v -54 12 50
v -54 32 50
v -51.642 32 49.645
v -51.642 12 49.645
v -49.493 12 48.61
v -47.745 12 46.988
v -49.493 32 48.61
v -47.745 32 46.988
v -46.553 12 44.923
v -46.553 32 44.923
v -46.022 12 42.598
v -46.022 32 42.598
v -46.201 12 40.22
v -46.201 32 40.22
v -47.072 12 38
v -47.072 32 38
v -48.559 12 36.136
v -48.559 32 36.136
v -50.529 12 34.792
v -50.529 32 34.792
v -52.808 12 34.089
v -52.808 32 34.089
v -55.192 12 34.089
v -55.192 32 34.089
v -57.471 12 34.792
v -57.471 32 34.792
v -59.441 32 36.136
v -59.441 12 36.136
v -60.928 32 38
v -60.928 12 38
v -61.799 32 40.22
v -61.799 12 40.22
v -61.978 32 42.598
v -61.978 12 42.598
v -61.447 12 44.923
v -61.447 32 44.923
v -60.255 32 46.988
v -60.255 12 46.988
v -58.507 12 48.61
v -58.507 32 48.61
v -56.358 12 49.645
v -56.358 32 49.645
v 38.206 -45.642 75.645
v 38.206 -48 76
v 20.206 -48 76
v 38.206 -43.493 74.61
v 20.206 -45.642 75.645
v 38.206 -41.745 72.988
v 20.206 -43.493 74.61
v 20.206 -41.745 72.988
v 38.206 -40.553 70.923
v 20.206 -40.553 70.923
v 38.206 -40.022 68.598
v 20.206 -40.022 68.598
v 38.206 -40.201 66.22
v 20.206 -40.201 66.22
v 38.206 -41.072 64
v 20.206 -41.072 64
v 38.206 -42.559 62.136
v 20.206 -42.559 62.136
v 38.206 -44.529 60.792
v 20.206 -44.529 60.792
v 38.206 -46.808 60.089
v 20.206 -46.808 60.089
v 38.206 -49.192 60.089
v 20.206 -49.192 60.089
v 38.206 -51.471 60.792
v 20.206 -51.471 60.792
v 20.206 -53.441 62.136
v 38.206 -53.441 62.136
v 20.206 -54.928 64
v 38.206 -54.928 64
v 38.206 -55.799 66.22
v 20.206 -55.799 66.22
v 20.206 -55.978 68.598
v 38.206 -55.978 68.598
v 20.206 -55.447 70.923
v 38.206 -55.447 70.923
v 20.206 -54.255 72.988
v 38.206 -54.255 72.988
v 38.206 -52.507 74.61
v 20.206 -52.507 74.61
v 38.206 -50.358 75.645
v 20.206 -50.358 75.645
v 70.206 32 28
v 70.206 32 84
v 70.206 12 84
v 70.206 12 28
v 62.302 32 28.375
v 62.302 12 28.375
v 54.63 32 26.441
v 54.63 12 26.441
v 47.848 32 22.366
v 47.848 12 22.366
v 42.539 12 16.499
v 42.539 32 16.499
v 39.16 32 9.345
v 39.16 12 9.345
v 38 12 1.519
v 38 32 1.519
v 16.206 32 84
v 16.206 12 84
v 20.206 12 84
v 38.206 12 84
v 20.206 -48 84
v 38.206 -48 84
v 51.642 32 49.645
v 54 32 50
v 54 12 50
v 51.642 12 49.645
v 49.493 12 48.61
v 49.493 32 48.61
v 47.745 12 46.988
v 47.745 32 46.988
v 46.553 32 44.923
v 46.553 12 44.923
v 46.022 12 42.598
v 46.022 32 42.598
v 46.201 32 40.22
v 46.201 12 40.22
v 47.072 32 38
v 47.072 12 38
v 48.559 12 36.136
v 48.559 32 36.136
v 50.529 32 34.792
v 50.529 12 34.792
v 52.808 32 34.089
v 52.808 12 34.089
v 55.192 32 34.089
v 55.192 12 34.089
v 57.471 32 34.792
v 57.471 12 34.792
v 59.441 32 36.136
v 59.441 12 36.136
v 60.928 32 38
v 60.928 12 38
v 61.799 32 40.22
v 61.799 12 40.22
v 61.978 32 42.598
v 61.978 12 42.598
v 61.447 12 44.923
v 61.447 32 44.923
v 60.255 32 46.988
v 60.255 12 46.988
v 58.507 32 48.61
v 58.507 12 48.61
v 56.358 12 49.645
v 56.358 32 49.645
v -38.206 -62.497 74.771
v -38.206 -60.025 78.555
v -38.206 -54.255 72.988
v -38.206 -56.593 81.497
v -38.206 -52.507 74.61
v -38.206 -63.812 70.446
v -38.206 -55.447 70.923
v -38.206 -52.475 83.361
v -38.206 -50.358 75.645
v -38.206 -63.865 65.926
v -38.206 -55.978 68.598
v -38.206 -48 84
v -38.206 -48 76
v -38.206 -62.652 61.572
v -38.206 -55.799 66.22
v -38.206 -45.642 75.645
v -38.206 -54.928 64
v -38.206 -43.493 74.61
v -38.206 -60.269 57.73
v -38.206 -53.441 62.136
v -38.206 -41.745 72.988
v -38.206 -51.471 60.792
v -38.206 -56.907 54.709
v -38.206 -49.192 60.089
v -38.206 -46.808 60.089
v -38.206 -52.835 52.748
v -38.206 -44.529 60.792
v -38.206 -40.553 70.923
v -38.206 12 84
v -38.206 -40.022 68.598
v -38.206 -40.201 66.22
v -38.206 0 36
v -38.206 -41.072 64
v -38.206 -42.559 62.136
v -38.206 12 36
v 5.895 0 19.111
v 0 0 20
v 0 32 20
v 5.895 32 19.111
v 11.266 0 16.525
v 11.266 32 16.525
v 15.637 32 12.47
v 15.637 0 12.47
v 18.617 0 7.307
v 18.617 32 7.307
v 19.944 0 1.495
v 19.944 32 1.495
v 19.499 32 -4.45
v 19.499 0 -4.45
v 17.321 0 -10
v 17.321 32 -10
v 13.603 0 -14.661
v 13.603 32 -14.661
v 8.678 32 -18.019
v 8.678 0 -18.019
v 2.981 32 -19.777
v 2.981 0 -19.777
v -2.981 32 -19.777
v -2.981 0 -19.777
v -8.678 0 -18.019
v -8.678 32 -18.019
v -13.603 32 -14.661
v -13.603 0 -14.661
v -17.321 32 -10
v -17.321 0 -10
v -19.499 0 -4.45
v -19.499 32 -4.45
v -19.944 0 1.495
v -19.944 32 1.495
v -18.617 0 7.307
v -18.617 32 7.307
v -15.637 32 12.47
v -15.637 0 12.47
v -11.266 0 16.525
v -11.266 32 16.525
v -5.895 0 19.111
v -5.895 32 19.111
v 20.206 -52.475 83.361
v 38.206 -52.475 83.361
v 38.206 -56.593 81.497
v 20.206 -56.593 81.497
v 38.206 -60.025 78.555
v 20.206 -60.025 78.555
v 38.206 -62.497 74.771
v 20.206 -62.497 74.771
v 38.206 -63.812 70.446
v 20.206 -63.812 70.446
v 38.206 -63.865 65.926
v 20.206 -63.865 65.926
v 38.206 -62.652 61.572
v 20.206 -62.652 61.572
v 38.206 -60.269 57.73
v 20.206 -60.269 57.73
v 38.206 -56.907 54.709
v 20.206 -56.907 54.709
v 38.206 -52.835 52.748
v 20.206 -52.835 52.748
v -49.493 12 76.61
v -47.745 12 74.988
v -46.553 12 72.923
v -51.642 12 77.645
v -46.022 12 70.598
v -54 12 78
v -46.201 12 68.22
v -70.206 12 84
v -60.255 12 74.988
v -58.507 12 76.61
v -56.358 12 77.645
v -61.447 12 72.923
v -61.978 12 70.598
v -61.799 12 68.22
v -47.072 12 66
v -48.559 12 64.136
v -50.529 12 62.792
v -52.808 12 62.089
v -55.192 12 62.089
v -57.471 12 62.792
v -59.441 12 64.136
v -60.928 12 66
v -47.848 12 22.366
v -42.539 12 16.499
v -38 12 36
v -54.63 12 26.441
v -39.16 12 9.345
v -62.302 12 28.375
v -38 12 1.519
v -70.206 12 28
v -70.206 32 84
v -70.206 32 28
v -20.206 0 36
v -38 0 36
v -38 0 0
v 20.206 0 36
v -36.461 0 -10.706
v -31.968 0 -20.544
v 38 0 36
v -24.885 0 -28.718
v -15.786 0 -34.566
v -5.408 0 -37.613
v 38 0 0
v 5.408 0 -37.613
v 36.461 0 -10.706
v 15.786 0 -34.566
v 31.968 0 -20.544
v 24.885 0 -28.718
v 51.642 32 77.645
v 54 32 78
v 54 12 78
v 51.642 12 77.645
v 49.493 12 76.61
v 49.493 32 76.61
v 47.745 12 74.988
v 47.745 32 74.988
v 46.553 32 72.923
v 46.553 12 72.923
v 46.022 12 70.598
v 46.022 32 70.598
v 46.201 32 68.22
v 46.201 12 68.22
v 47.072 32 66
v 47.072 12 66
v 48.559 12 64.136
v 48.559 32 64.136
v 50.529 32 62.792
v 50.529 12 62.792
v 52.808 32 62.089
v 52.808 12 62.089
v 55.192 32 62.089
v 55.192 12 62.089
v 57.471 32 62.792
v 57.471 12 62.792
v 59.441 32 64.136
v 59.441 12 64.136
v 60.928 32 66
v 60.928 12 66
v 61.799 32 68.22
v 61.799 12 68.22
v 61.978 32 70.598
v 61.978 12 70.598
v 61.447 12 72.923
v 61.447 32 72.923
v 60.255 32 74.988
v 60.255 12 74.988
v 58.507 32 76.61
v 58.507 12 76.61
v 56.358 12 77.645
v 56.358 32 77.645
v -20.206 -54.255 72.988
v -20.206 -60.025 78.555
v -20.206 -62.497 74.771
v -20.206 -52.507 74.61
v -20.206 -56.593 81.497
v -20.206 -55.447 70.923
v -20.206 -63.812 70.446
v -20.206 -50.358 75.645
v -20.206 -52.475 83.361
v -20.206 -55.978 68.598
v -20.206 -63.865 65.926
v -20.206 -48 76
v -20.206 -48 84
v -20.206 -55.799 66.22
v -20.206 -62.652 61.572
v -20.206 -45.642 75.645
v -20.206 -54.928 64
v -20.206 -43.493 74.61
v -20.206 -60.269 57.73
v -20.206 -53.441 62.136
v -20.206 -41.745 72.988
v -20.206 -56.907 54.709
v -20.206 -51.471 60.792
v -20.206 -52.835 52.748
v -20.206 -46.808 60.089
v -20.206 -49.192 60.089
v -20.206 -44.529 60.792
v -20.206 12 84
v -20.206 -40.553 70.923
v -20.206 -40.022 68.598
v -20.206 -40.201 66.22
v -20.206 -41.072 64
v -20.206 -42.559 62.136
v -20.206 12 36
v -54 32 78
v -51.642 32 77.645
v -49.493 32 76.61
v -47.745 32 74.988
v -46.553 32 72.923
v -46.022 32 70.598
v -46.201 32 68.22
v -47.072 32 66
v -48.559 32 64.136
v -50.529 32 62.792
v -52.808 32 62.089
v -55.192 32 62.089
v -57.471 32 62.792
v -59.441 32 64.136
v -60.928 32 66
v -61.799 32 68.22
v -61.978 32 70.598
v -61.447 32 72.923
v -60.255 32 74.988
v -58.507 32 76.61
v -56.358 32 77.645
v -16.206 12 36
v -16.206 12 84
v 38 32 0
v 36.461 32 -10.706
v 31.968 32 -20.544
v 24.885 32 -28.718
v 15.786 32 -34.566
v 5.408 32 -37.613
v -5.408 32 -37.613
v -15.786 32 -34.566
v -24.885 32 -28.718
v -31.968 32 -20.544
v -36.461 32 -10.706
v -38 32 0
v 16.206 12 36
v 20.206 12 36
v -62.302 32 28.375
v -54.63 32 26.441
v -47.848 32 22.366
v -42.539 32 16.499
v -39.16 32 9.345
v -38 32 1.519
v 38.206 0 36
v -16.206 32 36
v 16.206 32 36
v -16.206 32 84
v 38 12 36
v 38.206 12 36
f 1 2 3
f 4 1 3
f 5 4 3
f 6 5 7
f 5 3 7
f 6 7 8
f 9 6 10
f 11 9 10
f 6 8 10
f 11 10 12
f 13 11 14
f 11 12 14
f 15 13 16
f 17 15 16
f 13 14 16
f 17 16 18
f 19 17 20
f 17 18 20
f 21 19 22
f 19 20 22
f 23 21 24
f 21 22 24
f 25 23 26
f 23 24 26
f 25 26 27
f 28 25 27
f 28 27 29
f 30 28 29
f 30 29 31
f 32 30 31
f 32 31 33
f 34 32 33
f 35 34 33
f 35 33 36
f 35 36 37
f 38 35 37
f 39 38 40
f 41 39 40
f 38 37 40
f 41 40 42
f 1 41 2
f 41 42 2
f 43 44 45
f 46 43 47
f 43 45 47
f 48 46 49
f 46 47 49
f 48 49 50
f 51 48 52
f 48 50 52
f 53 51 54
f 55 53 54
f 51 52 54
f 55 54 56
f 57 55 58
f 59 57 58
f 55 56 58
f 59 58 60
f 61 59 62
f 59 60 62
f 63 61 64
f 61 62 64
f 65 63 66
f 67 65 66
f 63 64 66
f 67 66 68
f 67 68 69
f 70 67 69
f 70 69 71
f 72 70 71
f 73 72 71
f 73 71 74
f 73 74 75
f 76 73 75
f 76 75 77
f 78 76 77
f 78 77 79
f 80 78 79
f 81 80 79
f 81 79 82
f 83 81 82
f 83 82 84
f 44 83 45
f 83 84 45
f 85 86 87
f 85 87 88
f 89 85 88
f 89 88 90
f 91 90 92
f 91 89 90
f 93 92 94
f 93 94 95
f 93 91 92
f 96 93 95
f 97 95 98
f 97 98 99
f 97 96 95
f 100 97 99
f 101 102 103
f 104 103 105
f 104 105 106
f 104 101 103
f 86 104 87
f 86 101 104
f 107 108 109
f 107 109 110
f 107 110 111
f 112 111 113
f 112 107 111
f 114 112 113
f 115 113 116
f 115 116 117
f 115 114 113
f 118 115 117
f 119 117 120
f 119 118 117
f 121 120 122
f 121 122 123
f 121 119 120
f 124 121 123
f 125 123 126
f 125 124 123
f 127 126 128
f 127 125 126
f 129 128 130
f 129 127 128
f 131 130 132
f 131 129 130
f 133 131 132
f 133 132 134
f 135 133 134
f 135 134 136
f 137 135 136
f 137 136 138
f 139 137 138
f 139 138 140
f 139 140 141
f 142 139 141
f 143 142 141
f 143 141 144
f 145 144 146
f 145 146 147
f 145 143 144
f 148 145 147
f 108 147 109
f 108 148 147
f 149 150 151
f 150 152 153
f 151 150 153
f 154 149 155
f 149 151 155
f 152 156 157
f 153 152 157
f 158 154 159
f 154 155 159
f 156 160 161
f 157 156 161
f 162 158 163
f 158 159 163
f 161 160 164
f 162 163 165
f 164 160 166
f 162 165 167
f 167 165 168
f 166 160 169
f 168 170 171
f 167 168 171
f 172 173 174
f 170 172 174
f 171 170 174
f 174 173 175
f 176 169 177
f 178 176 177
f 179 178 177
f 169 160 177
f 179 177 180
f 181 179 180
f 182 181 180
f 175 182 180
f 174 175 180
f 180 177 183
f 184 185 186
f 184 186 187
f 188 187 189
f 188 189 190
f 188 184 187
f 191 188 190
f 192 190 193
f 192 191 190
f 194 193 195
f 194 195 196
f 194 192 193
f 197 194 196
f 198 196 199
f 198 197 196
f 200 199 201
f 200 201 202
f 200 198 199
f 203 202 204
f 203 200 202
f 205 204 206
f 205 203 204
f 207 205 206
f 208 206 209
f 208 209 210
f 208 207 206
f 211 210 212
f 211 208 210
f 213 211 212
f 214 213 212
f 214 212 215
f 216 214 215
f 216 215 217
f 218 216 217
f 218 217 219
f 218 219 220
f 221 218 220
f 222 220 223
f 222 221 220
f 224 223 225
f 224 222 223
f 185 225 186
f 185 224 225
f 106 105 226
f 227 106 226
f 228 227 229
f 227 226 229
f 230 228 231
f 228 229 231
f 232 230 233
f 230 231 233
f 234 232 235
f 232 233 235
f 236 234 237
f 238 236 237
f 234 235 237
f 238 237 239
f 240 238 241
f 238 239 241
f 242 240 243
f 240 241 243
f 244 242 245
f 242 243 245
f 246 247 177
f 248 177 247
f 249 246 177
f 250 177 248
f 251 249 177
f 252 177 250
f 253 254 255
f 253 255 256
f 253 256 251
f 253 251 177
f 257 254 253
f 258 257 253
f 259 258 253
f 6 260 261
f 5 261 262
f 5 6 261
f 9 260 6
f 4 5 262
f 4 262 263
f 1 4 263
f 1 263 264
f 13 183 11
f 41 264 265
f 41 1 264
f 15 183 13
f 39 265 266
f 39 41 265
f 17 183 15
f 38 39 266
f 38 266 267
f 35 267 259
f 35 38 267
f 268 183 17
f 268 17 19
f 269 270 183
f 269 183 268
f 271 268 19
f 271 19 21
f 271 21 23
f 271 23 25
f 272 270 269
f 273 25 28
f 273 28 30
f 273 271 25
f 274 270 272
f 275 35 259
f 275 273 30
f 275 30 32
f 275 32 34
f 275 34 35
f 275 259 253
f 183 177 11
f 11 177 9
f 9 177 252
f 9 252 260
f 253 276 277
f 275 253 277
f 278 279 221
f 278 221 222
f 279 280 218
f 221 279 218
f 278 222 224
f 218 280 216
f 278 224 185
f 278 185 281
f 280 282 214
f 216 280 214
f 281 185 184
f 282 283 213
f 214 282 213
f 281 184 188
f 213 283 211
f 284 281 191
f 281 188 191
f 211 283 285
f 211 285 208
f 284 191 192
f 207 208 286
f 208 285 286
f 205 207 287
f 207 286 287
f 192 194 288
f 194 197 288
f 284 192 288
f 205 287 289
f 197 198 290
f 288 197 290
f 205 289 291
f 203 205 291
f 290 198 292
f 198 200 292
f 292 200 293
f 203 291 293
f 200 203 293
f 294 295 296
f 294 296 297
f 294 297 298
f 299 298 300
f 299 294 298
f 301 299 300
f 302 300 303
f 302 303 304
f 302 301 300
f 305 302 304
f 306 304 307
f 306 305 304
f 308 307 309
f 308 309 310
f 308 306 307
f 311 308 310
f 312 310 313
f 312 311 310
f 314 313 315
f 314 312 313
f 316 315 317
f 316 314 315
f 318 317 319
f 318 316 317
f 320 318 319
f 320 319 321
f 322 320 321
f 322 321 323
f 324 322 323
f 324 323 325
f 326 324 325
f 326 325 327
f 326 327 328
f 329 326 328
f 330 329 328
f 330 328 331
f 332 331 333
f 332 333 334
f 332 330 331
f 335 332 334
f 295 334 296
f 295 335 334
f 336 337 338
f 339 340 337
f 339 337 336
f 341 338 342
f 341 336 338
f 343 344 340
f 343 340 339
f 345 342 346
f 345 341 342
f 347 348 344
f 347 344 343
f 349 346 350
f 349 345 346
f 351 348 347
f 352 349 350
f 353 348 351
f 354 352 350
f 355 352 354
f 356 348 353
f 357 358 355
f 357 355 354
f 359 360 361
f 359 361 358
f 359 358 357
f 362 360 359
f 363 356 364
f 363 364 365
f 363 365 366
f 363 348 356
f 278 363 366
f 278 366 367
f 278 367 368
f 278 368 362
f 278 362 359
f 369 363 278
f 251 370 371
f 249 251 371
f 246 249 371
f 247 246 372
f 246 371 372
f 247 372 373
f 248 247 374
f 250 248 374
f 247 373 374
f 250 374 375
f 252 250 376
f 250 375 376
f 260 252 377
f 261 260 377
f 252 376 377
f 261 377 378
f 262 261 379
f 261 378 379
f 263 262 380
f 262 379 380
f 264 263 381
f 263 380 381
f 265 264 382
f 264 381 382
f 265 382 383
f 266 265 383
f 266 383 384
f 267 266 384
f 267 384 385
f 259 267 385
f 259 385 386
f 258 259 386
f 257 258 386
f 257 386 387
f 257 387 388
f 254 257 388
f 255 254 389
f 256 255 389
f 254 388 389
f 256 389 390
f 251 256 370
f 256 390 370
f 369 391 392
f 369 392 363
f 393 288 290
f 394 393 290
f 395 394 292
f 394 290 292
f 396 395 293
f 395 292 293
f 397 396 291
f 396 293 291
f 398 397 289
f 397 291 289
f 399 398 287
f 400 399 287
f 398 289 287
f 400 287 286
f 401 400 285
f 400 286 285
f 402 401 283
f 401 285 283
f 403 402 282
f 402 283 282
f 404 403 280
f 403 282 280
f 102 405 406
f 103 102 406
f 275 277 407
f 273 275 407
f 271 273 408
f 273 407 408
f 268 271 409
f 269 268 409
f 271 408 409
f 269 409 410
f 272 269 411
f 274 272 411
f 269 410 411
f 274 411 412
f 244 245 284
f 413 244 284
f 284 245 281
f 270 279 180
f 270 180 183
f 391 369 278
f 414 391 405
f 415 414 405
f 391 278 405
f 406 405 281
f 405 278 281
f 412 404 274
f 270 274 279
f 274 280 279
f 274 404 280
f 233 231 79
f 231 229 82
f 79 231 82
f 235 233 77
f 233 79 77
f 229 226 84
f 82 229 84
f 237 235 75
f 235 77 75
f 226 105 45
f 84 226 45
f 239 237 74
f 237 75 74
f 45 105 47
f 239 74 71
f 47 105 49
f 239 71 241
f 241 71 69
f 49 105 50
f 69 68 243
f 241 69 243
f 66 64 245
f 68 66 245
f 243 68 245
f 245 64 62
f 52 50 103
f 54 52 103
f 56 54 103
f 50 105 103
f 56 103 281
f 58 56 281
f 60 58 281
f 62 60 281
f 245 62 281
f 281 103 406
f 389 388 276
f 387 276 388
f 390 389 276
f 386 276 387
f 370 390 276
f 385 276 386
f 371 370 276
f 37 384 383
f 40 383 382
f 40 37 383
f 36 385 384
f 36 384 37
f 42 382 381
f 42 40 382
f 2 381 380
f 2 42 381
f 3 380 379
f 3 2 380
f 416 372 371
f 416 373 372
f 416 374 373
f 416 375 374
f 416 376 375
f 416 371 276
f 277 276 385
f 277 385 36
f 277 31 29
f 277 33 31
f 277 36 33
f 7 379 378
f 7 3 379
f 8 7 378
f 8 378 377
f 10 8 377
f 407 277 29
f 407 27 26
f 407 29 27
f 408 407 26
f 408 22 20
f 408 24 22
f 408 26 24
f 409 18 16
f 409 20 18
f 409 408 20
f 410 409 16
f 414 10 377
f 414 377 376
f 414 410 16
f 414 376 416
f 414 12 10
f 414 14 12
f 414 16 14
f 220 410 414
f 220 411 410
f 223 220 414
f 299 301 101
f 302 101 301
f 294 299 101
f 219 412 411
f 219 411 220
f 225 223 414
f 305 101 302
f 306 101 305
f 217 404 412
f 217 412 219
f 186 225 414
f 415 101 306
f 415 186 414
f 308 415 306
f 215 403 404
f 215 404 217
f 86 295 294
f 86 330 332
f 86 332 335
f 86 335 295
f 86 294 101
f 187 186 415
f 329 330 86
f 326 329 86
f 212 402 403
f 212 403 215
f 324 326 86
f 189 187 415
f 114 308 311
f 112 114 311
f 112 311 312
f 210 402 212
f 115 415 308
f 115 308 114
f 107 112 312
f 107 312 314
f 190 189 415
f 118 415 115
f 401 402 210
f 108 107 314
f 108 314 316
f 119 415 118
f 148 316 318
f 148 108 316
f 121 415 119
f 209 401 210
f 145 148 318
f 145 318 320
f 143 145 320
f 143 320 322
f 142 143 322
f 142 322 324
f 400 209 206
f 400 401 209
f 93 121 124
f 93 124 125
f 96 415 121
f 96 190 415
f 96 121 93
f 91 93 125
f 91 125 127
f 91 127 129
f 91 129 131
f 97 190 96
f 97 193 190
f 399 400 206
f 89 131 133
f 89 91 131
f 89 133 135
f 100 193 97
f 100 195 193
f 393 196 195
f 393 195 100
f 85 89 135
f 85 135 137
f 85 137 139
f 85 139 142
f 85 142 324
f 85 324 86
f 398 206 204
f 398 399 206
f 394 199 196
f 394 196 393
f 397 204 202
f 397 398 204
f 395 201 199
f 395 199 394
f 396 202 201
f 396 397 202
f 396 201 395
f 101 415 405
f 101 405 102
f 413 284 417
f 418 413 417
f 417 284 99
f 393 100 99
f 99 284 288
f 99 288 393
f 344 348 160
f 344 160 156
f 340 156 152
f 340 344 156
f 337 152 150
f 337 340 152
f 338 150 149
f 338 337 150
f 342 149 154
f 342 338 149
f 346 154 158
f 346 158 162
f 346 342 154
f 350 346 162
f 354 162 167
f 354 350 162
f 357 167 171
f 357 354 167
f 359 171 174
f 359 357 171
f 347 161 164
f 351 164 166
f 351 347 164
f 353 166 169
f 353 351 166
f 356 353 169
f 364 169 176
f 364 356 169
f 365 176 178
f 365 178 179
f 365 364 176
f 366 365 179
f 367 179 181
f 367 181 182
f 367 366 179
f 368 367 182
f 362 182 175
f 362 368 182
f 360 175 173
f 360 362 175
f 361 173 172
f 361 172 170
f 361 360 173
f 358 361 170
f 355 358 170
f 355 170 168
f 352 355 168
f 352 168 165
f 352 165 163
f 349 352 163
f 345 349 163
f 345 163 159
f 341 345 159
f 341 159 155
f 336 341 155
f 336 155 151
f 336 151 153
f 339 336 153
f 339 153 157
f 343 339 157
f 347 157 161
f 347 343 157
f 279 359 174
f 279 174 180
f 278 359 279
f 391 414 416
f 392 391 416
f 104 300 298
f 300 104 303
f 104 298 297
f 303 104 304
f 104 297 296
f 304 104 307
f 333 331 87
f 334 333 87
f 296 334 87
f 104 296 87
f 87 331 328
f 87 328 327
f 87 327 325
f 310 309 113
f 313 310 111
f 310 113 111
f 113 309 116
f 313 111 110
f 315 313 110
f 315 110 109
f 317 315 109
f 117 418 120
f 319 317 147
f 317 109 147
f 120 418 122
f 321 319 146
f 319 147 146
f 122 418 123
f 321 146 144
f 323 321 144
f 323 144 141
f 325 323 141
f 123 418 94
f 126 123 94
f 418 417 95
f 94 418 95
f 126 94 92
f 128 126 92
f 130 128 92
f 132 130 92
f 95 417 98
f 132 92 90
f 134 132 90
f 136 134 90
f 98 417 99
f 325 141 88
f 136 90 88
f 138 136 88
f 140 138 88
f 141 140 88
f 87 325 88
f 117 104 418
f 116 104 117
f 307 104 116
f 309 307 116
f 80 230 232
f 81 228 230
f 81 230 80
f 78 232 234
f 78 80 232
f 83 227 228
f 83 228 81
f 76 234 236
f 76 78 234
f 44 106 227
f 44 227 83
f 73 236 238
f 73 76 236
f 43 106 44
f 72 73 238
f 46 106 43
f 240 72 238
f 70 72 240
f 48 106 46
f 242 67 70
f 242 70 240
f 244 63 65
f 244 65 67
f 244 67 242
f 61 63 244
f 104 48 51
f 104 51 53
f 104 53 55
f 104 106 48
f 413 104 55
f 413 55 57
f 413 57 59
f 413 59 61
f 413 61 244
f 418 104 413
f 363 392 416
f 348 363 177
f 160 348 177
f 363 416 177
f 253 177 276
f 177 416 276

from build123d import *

# Parameters (mm, degrees)
SKETCH1_R           = 20
BOSS_EXTRUDE1_DEPTH = 32
SKETCH2_R           = 8
BOSS_EXTRUDE3_DEPTH = 20
BOSS_EXTRUDE4_START = -4
SKETCH11_R          = 8
BOSS_EXTRUDE4_DEPTH = 18


with BuildPart() as part:
    # Sketch1 → Boss-Extrude1 (new body)
    with BuildSketch(Plane(origin=(0, 0, 0), x_dir=(1, 0, 0), z_dir=(0, 1, 0))):
        with BuildLine():
            Line((-38, -36), (38, -36))
            Line((38, -36), (38, 0))
            ThreePointArc((38, 0), (0, 38), (-38, 0))
            Line((-38, 0), (-38, -36))
        make_face()
        with Locations(Location((0, 0, 0), (0, 0, 270))):
            Circle(SKETCH1_R, mode=Mode.SUBTRACT)
    extrude(amount=BOSS_EXTRUDE1_DEPTH)

    # Sketch2 → Boss-Extrude3 (add)
    with BuildSketch(Plane(origin=(0, 32, 0), x_dir=(1, 0, 0), z_dir=(0, 1, 0))):
        with BuildLine():
            Line((-16.20578503, -84), (-38.20578503, -84))
            Line((-38.20578503, -84), (-70.20578503, -84))
            Line((-70.20578503, -84), (-70.20578503, -28))
            ThreePointArc((-70.20578503, -28), (-47.848139938, -22.366161341), (-38, -1.518653771))
            Line((-38, -1.518653771), (-38, -36))
            Line((-38, -36), (-16.20578503, -36))
            Line((-16.20578503, -36), (-16.20578503, -84))
        make_face()
        with Locations(Location((-54, -42, 0), (0, 0, 270))):
            Circle(SKETCH2_R, mode=Mode.SUBTRACT)
        with Locations(Location((-54, -70, 0), (0, 0, 270))):
            Circle(SKETCH2_R, mode=Mode.SUBTRACT)
    boss_extrude3 = extrude(amount=-BOSS_EXTRUDE3_DEPTH)

    # Mirror1: Boss-Extrude3 across plane
    add(boss_extrude3.mirror(Plane(origin=(0, 0, 0), x_dir=(0, 0, 1), z_dir=(1, 0, 0))))

    # Sketch11 → Boss-Extrude4 (add)
    with BuildSketch(Plane.ZY.offset(-16.20578503).offset(BOSS_EXTRUDE4_START)):
        with BuildLine():
            Line((36, 12), (84, 12))
            Line((84, 12), (84, -48))
            ThreePointArc((84, -48), (70.446111196, -63.811911333), (52.747932498, -52.834711668))
            Line((52.747932498, -52.834711668), (36, 0))
            Line((36, 0), (36, 12))
        make_face()
        with Locations((68, -48)):
            Circle(SKETCH11_R, mode=Mode.SUBTRACT)
    boss_extrude4 = extrude(amount=-BOSS_EXTRUDE4_DEPTH)

    # Mirror2: Boss-Extrude4 across plane
    add(boss_extrude4.mirror(Plane(origin=(0, 0, 0), x_dir=(0, 0, 1), z_dir=(1, 0, 0))))


solid = part.part
